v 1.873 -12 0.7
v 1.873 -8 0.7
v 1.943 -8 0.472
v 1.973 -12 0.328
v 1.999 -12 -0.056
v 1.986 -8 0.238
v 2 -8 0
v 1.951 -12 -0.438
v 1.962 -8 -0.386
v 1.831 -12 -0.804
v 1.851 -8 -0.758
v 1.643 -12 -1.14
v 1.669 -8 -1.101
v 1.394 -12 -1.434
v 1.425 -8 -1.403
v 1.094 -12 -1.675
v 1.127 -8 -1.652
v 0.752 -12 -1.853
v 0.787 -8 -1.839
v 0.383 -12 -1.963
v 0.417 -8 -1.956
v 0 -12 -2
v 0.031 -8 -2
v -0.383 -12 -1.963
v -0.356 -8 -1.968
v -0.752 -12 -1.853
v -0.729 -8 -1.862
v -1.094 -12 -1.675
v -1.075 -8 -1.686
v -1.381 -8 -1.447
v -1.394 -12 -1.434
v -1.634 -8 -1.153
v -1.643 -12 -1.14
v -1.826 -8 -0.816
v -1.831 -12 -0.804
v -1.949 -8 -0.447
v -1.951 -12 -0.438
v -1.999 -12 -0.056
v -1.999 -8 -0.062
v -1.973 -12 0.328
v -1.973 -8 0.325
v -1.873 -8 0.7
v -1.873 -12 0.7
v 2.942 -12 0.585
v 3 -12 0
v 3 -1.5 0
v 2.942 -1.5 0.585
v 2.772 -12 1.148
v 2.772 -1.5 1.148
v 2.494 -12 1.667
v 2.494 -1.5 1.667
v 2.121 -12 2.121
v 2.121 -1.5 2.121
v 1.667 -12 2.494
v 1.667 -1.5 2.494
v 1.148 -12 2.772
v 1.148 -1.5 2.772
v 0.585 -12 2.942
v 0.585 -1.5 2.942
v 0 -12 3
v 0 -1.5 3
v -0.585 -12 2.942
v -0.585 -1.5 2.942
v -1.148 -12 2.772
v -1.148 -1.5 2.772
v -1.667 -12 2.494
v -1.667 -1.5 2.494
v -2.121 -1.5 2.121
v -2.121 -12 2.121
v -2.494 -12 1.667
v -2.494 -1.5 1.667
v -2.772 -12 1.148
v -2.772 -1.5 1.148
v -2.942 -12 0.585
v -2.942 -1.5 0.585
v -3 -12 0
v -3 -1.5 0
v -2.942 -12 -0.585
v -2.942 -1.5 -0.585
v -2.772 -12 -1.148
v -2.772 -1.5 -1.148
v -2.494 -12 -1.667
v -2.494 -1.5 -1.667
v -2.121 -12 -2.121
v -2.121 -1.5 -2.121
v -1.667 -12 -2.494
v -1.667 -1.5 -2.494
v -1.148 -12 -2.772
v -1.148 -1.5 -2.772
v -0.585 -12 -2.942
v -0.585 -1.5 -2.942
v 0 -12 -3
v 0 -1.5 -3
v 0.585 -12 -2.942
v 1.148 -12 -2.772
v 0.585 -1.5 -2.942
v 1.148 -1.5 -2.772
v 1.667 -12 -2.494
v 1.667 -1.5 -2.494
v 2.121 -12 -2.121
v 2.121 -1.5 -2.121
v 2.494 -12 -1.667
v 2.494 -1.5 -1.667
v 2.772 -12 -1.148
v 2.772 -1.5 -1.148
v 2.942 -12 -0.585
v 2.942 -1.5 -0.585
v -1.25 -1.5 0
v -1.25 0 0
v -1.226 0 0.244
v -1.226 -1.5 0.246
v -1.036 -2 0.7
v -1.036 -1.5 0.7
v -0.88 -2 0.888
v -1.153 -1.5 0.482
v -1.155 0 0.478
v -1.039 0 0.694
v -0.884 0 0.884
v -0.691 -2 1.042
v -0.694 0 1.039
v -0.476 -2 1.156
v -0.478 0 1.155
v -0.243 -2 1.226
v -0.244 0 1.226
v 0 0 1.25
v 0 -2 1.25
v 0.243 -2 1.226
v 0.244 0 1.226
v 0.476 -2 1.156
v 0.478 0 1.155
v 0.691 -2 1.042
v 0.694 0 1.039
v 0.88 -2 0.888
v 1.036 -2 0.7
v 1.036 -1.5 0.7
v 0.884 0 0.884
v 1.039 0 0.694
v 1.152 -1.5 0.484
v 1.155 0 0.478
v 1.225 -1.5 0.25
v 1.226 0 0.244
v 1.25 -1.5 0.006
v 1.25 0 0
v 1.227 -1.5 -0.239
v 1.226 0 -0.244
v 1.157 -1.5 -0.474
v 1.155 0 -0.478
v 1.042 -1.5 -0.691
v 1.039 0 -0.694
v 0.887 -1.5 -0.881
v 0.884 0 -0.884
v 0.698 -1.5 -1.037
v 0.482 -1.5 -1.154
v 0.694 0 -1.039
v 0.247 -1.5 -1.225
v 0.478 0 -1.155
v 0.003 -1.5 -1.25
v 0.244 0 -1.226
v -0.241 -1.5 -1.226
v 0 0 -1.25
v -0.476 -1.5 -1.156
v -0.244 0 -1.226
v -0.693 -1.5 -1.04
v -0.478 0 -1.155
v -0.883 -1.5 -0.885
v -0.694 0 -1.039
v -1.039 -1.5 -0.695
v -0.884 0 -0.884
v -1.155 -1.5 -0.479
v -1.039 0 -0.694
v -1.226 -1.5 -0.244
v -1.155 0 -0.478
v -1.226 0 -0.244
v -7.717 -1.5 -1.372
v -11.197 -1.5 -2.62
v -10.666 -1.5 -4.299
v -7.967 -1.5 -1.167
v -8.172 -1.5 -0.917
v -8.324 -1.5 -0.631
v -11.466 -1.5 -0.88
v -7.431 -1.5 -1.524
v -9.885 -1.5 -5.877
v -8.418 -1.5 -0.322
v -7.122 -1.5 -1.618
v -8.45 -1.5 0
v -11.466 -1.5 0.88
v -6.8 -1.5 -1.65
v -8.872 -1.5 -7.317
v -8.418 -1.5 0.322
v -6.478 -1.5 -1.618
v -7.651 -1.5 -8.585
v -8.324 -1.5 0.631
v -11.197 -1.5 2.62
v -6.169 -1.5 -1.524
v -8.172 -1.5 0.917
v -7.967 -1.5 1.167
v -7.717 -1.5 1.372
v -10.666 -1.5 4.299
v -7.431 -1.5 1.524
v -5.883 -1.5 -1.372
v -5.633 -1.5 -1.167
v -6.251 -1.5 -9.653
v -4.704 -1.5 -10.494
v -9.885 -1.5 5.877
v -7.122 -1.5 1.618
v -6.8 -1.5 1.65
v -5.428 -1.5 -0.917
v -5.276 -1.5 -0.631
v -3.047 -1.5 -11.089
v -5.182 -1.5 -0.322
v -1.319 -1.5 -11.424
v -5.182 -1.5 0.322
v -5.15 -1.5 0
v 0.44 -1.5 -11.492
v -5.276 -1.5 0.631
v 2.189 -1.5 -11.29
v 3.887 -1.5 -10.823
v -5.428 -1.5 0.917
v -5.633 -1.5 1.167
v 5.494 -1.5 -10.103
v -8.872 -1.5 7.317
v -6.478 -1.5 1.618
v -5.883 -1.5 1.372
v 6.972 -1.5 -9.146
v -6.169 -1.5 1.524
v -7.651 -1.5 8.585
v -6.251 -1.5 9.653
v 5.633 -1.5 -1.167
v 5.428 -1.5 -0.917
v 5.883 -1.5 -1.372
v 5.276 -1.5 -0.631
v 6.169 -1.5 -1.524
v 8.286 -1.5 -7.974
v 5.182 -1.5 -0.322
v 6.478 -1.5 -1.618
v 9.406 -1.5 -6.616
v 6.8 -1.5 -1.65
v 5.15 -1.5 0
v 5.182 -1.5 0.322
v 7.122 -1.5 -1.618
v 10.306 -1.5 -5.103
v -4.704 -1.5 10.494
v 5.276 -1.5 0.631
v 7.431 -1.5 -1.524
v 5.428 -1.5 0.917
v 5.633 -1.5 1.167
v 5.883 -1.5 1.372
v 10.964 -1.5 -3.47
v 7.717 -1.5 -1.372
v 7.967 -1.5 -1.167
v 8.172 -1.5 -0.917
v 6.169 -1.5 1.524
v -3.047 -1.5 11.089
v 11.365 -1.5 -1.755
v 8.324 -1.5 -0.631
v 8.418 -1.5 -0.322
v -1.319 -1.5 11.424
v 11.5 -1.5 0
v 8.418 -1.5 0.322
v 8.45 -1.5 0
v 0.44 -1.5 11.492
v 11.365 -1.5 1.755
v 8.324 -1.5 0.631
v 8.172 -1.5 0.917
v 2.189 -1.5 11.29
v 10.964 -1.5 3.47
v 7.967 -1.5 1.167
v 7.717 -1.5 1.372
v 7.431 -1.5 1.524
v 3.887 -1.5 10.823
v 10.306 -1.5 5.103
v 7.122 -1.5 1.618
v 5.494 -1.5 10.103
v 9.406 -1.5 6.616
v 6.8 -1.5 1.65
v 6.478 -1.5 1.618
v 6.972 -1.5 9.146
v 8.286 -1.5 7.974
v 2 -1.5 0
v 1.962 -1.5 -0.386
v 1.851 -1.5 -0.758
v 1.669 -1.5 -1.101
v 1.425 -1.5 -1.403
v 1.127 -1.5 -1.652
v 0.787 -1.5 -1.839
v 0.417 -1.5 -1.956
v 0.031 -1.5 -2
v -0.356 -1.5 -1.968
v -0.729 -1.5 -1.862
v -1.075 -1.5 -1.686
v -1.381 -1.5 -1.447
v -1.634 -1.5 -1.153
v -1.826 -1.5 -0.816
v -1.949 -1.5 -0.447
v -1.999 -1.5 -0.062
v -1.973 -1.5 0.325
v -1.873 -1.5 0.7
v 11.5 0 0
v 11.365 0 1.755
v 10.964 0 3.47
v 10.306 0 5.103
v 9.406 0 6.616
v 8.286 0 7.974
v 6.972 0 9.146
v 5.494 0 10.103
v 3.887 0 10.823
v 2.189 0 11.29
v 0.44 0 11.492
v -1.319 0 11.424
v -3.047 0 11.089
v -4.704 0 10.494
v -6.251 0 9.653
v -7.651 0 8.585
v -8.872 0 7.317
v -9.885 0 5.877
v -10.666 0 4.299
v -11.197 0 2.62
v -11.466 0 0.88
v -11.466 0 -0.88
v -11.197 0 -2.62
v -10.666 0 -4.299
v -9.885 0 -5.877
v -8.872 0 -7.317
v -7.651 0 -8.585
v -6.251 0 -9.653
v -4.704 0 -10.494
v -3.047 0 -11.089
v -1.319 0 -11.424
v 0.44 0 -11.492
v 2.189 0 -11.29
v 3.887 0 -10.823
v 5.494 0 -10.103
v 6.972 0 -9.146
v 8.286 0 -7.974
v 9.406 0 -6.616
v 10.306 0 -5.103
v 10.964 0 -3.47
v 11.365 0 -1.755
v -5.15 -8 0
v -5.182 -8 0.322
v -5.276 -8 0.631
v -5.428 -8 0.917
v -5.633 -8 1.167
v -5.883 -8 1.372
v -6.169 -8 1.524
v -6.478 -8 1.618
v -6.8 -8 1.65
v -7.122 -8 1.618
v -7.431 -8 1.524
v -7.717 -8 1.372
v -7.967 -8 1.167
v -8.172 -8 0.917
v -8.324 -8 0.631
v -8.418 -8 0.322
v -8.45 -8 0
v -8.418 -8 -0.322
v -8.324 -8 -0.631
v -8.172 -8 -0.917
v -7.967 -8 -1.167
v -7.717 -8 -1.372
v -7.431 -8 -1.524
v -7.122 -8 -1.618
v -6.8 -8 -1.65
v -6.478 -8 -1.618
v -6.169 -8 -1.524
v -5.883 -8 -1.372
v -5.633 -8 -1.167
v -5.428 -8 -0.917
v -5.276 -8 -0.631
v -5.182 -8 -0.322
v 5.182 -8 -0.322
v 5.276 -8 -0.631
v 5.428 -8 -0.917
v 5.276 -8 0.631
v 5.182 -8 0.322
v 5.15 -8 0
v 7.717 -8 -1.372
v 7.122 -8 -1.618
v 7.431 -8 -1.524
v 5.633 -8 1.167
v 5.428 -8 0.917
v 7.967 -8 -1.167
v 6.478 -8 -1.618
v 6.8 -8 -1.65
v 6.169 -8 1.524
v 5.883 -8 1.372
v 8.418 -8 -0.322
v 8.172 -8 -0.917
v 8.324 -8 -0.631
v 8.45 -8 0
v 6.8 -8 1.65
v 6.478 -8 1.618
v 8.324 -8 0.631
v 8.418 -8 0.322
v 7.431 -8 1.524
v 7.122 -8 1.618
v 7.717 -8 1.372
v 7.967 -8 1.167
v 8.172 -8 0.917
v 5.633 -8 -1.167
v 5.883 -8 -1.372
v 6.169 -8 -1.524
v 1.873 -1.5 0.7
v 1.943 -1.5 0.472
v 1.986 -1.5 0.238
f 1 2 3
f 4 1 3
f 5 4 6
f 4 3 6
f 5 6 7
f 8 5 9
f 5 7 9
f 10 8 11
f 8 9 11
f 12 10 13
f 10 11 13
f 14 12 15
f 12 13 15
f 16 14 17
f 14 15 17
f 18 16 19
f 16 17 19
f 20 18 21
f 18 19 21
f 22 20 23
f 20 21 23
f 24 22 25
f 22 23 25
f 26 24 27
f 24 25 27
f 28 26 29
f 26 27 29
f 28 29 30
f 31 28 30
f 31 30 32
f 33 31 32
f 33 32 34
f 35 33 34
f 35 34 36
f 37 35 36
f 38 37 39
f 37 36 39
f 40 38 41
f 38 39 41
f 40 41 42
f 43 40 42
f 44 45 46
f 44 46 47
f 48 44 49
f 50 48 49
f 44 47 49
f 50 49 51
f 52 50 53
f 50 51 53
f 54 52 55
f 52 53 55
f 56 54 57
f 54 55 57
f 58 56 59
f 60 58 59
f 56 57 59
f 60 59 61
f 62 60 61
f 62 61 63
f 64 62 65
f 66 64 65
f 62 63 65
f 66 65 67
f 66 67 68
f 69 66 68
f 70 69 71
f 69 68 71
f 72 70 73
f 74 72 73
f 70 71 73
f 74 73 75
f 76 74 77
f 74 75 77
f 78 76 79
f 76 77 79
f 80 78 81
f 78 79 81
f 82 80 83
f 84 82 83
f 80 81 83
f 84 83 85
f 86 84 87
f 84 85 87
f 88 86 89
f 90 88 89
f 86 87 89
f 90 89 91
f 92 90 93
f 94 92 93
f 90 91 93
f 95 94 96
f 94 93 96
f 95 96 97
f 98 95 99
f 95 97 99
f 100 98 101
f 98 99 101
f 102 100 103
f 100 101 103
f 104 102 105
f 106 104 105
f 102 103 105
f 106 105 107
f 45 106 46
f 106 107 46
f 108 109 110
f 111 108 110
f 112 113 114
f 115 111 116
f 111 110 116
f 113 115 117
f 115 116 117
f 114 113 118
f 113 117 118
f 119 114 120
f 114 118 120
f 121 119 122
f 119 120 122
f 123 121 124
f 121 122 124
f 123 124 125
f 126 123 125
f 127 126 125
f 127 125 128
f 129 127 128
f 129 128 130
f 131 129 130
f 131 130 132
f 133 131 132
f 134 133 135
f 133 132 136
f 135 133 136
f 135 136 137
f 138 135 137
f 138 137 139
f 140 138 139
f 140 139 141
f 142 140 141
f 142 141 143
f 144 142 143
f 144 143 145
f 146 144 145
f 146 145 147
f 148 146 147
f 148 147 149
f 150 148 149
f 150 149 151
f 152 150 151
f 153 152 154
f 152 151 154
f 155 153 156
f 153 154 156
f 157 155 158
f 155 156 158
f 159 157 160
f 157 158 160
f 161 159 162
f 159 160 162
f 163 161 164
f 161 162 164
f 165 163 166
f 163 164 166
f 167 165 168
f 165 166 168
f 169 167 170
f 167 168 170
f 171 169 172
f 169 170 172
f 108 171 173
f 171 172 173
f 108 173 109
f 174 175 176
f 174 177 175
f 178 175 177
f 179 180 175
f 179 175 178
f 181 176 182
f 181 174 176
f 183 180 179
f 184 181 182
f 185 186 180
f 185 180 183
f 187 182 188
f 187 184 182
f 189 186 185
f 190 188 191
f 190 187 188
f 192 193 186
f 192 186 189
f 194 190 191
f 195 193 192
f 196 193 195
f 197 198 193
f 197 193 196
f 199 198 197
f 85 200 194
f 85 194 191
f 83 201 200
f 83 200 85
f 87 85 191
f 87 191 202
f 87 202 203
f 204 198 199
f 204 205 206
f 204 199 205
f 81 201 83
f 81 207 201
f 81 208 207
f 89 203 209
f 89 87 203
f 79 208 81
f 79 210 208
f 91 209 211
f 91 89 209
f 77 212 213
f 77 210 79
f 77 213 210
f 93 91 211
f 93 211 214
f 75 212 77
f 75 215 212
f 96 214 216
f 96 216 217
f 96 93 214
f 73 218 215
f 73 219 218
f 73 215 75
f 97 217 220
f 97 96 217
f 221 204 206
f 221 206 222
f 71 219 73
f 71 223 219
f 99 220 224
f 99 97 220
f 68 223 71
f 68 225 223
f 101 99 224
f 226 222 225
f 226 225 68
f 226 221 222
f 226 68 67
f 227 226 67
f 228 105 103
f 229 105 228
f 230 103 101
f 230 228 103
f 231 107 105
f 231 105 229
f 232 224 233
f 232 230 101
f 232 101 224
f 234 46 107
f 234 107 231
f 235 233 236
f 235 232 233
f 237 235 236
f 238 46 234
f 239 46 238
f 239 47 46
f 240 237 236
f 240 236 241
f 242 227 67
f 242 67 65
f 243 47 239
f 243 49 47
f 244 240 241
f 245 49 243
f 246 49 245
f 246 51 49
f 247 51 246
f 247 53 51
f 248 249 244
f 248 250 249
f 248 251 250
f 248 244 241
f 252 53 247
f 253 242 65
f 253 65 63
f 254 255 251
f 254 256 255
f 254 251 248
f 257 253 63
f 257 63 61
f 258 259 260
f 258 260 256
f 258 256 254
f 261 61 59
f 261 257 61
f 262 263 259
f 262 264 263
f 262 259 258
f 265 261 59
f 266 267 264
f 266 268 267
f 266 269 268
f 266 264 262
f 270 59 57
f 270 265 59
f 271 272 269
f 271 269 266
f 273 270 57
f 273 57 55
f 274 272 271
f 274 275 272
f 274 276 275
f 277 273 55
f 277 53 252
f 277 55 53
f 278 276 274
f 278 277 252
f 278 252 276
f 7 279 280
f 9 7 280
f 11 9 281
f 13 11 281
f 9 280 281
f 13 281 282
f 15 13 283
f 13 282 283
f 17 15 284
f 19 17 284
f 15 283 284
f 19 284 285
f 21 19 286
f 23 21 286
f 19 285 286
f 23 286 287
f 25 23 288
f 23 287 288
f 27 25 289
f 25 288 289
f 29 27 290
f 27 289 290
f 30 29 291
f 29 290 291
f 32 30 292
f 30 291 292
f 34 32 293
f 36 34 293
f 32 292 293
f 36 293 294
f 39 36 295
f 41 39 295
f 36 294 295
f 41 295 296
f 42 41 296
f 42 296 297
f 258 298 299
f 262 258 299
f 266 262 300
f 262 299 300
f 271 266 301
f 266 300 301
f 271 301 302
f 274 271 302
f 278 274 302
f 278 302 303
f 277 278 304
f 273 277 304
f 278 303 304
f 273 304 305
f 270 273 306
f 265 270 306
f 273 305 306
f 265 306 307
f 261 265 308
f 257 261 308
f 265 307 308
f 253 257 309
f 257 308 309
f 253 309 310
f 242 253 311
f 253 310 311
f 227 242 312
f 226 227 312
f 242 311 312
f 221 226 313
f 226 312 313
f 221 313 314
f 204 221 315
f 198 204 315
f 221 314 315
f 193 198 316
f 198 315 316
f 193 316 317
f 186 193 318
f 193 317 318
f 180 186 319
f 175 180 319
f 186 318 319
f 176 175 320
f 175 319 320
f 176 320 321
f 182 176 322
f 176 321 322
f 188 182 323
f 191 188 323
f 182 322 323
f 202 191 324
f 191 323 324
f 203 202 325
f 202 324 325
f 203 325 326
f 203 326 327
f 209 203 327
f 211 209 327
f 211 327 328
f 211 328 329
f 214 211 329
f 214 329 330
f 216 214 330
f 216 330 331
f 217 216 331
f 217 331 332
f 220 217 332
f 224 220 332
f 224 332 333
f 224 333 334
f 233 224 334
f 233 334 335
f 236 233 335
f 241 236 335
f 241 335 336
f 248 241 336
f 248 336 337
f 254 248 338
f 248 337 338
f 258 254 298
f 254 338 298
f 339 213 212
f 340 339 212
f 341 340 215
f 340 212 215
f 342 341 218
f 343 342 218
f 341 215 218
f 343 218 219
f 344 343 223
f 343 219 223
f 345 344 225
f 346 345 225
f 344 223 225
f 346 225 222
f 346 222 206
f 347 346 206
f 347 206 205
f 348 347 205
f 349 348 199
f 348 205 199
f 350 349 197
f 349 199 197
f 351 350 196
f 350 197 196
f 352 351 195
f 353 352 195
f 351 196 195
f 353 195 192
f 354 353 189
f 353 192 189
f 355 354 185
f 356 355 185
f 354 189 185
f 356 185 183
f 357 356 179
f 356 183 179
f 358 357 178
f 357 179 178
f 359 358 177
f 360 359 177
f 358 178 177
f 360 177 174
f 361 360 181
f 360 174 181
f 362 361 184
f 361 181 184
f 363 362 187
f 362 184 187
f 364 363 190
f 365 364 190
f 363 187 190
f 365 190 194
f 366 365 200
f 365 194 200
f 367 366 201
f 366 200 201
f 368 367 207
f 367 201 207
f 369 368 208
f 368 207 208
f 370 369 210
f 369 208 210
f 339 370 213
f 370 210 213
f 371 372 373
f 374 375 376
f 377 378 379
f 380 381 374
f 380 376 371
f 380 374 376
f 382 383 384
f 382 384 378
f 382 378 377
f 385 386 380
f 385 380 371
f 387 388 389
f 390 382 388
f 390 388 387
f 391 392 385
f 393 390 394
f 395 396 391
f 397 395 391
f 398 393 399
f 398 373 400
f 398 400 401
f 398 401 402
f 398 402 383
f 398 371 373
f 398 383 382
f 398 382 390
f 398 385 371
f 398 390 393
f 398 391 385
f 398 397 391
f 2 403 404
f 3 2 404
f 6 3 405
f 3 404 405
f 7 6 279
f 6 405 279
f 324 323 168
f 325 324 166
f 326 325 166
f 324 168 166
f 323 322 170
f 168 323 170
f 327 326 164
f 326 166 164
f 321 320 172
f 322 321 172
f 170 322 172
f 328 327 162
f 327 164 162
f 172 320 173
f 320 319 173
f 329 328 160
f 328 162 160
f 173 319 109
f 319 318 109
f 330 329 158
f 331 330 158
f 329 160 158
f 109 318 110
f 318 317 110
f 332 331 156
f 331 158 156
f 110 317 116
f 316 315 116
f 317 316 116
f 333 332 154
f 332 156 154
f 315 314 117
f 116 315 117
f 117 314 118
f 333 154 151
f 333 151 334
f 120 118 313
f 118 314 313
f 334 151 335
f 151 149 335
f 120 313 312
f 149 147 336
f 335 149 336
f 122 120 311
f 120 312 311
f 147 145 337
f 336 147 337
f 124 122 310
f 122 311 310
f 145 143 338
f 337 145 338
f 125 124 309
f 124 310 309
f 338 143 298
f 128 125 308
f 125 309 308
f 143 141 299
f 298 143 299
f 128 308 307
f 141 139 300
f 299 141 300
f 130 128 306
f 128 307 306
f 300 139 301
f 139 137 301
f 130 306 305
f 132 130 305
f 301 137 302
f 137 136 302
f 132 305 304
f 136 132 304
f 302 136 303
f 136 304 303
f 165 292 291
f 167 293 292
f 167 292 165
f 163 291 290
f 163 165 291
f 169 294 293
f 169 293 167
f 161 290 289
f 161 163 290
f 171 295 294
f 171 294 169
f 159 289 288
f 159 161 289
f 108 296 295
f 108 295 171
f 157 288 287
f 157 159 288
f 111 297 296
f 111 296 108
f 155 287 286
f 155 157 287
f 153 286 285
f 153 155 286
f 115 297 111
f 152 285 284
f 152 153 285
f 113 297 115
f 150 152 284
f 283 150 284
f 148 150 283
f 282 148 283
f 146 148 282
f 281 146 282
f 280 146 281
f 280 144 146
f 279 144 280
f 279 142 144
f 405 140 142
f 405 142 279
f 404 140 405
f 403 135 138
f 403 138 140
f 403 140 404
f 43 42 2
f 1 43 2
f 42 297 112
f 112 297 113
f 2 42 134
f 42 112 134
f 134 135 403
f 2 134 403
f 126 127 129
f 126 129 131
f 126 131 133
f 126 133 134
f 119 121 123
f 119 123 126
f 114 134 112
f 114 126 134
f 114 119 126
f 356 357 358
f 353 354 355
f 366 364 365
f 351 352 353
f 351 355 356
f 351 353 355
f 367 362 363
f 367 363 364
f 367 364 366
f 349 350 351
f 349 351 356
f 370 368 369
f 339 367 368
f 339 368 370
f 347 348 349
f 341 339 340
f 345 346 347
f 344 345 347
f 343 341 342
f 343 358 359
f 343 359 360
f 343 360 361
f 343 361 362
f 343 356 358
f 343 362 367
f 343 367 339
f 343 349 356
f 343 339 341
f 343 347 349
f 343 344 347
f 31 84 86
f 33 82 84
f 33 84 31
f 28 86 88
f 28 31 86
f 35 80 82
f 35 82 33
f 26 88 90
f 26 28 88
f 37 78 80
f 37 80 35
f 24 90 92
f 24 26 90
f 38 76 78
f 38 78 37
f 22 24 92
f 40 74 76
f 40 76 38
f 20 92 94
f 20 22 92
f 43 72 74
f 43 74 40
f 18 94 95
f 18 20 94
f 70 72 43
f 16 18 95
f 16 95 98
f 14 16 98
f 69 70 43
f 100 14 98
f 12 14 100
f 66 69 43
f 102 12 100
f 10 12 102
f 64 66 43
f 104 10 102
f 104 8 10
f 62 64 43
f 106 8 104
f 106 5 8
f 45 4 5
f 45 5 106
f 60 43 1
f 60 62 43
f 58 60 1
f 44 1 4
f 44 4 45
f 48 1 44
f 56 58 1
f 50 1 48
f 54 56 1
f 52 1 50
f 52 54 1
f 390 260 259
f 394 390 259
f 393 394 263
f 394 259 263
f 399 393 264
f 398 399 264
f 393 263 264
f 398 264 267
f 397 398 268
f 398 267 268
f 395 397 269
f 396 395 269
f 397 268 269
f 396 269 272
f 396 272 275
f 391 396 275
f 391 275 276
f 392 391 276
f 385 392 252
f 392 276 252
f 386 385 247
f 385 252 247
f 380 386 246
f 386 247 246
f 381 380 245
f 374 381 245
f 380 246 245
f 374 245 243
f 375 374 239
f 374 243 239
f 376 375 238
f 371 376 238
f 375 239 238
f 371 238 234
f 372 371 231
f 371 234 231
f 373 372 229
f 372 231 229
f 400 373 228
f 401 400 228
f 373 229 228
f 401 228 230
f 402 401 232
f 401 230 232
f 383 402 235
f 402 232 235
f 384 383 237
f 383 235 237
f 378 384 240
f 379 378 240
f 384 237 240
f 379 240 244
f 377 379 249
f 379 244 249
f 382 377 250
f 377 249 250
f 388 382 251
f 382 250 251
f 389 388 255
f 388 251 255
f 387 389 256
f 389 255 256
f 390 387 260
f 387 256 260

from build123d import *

# Parameters (mm, degrees)
F0_R      = 11.5
F0_R_2    = 3
F0_R_3    = 1.8
F1_DEPTH  = 1.5
F2_R      = 1.65
F2_R_2    = 3
F3_DEPTH  = 6.5
F3_FACE_R = 3
F4_DEPTH  = 4
F5_R      = 1.25
F6_DEPTH  = 2


with BuildPart() as f1:
    # F0 (on Front) → F1 (new body)
    with BuildSketch(Plane.XZ):
        Circle(F0_R)
        Circle(F0_R_2, mode=Mode.SUBTRACT)
        with Locations((6.5, 0)):
            Circle(F0_R_3, mode=Mode.SUBTRACT)
        Circle(F0_R_2)
        with Locations((6.5, 0)):
            Circle(F0_R_3)
    extrude(amount=F1_DEPTH)

    # F2 (on face) → F3 (join)
    with BuildSketch(Plane.XZ.offset(1.5)):
        with Locations((-6.8, 0)):
            Circle(F2_R)
        Circle(F2_R_2)
        with BuildLine():
            ThreePointArc((1.873499, 0.7), (1.968121, 0.355669), (2, 0))
            ThreePointArc((2, 0), (-0.355669, -1.968121), (-1.873499, 0.7))
            ThreePointArc((-1.873499, 0.7), (0, 2), (1.873499, 0.7))
        make_face(mode=Mode.SUBTRACT)
        with BuildLine():
            Line((-1.873499, 0.7), (1.873499, 0.7))
            ThreePointArc((1.873499, 0.7), (0, 2), (-1.873499, 0.7))
        make_face()
        with Locations((6.8, 0)):
            Circle(F2_R)
    extrude(amount=F3_DEPTH)

    # F3_face (on face) → F4 (join)
    with BuildSketch(Plane(origin=(0, -8, 0.227747), x_dir=(1, 0, 0), z_dir=(0, -1, 0))):
        with Locations((0, -0.227747)):
            Circle(F3_FACE_R)
        with BuildLine():
            ThreePointArc((1.873499, 0.472253), (0, -2.227747), (-1.873499, 0.472253))
            Line((-1.873499, 0.472253), (1.873499, 0.472253))
        make_face(mode=Mode.SUBTRACT)
    extrude(amount=F4_DEPTH)

    # F5 (on face) → F6 (cut)
    with BuildSketch(Plane(origin=(0, 0, 0), x_dir=(-1, 0, 0), z_dir=(0, 1, 0))):
        Circle(F5_R)
    extrude(amount=-F6_DEPTH, mode=Mode.SUBTRACT)


solid = f1.part
